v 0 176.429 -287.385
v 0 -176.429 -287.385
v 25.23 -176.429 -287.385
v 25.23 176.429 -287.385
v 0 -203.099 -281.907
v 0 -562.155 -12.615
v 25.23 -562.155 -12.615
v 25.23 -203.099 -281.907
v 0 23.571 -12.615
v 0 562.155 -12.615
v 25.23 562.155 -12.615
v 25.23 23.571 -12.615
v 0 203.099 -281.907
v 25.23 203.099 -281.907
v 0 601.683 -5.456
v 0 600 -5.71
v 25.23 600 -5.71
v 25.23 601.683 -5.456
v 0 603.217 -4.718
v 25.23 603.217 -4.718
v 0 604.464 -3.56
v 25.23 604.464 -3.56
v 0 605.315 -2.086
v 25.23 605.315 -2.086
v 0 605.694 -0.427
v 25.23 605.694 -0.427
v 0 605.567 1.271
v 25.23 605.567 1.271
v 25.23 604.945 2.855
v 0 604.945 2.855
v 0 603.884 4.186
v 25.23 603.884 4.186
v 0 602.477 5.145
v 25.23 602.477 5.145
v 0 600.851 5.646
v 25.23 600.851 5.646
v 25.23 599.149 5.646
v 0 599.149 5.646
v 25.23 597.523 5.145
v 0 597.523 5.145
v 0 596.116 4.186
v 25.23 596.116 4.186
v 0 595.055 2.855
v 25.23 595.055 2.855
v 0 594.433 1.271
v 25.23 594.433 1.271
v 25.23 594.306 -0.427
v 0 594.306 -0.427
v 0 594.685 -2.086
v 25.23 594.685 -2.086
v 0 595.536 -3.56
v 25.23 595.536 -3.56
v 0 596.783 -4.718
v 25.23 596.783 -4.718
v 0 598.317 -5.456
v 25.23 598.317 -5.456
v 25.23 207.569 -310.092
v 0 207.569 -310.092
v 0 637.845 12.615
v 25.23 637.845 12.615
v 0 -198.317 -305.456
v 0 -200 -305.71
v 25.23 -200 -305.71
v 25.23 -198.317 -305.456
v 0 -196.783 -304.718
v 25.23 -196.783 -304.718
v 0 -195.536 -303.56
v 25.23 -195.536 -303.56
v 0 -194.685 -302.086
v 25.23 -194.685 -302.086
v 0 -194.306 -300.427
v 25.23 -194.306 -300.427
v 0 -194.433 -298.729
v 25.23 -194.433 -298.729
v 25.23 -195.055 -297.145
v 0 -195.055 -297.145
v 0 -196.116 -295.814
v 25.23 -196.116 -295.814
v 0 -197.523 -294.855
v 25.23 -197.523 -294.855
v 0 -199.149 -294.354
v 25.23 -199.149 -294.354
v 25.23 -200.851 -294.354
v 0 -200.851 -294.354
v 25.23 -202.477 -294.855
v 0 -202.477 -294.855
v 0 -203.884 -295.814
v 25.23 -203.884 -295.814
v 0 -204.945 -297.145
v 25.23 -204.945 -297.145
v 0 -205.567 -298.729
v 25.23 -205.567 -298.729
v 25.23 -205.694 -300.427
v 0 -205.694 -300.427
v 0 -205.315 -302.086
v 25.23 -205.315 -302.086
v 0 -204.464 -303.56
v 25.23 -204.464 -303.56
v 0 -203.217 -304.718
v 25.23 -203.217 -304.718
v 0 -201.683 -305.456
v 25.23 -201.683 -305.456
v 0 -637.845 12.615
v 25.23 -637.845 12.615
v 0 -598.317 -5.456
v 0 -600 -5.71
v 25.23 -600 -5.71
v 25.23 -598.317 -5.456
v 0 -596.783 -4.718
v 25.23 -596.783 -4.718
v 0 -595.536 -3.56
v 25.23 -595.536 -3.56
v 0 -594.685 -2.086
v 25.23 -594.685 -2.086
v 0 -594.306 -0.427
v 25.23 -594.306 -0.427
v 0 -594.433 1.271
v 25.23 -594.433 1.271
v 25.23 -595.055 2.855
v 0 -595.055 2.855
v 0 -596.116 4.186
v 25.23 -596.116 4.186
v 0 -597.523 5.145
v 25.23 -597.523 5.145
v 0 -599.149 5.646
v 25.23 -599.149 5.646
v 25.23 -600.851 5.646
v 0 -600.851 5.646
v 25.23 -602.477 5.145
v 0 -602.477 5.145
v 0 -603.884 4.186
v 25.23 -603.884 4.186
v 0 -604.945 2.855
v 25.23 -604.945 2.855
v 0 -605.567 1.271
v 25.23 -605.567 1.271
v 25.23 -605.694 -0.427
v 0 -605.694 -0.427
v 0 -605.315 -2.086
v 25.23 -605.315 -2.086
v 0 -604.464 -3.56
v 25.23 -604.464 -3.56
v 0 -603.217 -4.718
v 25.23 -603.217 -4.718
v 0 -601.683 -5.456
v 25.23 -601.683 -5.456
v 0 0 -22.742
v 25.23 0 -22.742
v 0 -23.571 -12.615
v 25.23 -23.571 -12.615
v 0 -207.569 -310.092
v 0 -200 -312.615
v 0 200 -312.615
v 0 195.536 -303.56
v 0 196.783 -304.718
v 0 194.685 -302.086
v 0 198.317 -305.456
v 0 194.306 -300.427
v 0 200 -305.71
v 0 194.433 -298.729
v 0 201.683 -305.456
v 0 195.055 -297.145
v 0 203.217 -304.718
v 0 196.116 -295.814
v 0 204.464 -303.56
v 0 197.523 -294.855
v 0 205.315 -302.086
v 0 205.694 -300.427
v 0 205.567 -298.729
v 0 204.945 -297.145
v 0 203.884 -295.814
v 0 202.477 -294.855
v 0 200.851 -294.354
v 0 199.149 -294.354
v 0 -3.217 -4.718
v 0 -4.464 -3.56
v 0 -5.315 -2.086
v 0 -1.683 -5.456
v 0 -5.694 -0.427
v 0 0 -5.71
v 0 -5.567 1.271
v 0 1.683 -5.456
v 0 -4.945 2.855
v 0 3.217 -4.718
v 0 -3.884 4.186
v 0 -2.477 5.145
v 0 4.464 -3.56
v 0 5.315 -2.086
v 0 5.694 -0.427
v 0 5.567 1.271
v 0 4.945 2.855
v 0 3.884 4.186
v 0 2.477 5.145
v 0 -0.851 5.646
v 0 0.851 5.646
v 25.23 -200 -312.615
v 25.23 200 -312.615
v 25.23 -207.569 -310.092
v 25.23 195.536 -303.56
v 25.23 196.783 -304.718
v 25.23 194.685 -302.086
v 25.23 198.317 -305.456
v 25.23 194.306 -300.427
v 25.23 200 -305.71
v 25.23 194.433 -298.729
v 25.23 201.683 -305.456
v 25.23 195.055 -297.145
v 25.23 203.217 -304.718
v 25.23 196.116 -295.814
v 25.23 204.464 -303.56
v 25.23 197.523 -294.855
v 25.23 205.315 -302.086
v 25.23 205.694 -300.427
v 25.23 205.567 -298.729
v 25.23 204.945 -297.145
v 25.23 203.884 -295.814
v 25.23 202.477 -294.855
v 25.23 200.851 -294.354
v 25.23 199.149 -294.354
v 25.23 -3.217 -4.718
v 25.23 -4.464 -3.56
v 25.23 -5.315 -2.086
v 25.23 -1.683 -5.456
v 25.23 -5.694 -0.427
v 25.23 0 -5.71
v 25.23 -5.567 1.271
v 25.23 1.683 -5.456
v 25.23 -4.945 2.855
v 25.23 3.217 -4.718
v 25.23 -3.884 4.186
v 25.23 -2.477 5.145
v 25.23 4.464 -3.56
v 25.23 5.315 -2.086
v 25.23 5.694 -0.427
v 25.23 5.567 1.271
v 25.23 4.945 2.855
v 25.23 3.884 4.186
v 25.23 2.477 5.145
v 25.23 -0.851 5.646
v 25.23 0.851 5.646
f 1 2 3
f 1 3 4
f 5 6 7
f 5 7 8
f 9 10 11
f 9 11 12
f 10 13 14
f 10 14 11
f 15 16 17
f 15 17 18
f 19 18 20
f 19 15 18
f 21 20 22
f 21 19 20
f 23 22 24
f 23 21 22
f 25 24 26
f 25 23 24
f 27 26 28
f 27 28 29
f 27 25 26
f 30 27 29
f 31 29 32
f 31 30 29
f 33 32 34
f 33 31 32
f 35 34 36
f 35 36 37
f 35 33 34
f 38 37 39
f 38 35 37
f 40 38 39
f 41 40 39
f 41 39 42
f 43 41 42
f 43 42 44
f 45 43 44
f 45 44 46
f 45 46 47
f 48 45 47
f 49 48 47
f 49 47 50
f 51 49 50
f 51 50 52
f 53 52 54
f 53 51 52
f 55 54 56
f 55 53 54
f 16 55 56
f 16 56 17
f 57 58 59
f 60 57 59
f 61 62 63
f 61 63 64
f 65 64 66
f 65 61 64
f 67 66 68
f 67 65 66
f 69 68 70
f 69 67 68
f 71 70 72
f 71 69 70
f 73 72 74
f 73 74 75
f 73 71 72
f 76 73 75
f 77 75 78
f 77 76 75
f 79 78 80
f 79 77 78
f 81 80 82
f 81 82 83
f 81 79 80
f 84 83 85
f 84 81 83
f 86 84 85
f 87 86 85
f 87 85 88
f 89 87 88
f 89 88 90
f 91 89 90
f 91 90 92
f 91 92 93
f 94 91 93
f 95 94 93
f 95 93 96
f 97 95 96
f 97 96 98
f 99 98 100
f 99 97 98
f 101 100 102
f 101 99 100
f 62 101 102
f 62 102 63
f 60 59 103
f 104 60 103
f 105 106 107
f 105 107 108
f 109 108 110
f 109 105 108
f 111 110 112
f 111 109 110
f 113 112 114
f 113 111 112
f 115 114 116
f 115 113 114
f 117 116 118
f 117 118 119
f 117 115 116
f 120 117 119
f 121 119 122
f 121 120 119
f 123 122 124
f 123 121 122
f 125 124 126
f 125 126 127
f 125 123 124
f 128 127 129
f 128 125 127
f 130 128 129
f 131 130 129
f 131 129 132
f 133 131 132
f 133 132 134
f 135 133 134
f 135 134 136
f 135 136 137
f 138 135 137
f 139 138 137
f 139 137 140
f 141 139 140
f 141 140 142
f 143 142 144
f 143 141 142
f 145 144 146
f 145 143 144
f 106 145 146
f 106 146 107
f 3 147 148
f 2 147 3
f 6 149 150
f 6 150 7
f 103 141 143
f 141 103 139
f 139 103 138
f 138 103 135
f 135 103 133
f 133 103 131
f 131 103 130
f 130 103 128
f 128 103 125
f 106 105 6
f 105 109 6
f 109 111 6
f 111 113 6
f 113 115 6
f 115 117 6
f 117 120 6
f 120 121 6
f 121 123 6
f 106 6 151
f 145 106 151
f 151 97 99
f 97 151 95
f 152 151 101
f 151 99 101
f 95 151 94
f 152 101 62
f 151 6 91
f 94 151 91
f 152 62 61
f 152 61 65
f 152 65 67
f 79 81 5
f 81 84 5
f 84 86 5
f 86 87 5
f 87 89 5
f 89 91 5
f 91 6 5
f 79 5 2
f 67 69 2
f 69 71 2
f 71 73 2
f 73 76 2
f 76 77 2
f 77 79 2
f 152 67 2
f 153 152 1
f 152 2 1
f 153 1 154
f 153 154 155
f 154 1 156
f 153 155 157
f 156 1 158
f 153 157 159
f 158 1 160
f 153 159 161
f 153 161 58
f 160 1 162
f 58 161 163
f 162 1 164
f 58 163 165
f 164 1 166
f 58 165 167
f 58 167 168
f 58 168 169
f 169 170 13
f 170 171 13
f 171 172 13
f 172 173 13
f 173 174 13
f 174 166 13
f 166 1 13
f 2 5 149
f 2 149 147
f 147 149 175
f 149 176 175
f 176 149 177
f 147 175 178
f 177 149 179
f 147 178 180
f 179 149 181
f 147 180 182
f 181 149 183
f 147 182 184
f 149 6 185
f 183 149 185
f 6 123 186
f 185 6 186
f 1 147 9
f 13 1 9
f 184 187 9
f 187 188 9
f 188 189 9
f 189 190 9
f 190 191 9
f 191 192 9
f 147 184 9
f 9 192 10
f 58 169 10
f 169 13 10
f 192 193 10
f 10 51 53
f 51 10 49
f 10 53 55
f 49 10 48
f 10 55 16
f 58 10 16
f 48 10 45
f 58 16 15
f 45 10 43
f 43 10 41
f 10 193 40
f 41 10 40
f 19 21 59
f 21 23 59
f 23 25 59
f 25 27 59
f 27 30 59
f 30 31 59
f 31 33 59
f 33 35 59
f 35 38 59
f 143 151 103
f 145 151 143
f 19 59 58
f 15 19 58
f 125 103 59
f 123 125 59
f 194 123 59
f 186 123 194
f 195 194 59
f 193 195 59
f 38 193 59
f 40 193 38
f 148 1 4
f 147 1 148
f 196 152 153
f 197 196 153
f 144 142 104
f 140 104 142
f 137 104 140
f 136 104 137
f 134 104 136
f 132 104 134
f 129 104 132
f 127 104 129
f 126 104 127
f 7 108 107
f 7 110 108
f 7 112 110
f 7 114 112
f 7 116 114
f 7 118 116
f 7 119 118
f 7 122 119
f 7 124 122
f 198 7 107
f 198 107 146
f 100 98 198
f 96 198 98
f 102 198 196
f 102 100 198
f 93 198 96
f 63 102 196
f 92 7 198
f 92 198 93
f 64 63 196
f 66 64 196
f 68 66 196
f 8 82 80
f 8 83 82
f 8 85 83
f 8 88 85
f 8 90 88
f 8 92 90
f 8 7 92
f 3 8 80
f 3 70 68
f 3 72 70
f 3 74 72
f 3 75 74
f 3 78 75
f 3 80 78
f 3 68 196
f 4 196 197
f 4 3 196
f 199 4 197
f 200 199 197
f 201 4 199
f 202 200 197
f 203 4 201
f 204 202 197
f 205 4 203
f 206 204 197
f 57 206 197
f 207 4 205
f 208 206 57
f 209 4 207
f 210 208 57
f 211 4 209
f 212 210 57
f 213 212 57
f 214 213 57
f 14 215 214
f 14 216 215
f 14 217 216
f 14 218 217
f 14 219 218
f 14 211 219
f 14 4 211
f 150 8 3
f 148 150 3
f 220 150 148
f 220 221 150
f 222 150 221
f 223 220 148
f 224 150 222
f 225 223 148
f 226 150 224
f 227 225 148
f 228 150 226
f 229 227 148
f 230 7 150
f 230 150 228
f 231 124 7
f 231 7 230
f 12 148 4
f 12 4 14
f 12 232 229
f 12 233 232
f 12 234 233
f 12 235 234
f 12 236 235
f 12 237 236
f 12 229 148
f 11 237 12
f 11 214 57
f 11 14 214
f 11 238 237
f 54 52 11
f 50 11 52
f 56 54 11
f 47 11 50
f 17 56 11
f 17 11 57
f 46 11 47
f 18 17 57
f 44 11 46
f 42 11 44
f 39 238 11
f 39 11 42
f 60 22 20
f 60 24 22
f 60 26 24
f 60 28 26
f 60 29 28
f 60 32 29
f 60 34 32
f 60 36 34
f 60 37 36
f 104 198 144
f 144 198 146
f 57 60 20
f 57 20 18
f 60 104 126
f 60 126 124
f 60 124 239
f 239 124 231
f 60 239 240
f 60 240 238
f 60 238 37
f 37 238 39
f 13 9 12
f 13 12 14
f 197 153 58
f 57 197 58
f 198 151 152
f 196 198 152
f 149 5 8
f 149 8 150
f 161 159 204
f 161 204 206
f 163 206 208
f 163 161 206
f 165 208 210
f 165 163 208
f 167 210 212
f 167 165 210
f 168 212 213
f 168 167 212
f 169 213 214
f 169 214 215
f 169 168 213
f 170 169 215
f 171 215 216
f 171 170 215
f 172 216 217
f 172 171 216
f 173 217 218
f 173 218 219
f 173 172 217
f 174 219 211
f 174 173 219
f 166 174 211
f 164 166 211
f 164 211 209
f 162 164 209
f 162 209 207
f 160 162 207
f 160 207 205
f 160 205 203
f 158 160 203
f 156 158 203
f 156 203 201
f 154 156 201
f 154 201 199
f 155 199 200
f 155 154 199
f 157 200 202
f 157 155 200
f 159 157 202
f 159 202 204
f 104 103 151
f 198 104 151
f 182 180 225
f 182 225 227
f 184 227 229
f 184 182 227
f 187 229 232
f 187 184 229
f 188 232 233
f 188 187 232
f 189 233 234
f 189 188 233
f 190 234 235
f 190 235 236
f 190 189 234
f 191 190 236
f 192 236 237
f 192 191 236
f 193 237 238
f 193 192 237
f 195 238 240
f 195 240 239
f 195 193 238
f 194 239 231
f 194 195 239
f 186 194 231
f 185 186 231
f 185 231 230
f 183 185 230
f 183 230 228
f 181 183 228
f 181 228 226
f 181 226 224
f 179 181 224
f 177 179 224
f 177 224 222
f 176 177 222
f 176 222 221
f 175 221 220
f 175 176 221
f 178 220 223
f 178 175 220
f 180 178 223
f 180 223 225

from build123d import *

# Parameters (mm, degrees)
SKETCH1_R           = 5.71
BOSS_EXTRUDE1_DEPTH = 25.23


with BuildPart() as part:
    # Sketch1 → Boss-Extrude1 (new body)
    with BuildSketch(Plane.YZ):
        Polygon((0, 12.615), (-637.845, 12.615), (-207.569, -310.092), (-200, -312.615), (200, -312.615), (207.569, -310.092), (637.845, 12.615), align=None)
        with Locations(Location((-600, 0, 0), (0, 0, 270))):
            Circle(SKETCH1_R, mode=Mode.SUBTRACT)
        with Locations(Location((0, 0, 0), (0, 0, 270))):
            Circle(SKETCH1_R, mode=Mode.SUBTRACT)
        with Locations(Location((-200, -300, 0), (0, 0, 270))):
            Circle(SKETCH1_R, mode=Mode.SUBTRACT)
        with Locations(Location((200, -300, 0), (0, 0, 270))):
            Circle(SKETCH1_R, mode=Mode.SUBTRACT)
        with Locations(Location((600, 0, 0), (0, 0, 270))):
            Circle(SKETCH1_R, mode=Mode.SUBTRACT)
        Polygon((176.428656887, -287.385), (0, -22.74201467), (-176.428656887, -287.385), align=None, mode=Mode.SUBTRACT)
        Polygon((-562.155, -12.615), (-203.099228742, -281.906828443), (-23.571343113, -12.615), align=None, mode=Mode.SUBTRACT)
        Polygon((203.099228742, -281.906828443), (562.155, -12.615), (23.571343113, -12.615), align=None, mode=Mode.SUBTRACT)
    extrude(amount=BOSS_EXTRUDE1_DEPTH)


solid = part.part
